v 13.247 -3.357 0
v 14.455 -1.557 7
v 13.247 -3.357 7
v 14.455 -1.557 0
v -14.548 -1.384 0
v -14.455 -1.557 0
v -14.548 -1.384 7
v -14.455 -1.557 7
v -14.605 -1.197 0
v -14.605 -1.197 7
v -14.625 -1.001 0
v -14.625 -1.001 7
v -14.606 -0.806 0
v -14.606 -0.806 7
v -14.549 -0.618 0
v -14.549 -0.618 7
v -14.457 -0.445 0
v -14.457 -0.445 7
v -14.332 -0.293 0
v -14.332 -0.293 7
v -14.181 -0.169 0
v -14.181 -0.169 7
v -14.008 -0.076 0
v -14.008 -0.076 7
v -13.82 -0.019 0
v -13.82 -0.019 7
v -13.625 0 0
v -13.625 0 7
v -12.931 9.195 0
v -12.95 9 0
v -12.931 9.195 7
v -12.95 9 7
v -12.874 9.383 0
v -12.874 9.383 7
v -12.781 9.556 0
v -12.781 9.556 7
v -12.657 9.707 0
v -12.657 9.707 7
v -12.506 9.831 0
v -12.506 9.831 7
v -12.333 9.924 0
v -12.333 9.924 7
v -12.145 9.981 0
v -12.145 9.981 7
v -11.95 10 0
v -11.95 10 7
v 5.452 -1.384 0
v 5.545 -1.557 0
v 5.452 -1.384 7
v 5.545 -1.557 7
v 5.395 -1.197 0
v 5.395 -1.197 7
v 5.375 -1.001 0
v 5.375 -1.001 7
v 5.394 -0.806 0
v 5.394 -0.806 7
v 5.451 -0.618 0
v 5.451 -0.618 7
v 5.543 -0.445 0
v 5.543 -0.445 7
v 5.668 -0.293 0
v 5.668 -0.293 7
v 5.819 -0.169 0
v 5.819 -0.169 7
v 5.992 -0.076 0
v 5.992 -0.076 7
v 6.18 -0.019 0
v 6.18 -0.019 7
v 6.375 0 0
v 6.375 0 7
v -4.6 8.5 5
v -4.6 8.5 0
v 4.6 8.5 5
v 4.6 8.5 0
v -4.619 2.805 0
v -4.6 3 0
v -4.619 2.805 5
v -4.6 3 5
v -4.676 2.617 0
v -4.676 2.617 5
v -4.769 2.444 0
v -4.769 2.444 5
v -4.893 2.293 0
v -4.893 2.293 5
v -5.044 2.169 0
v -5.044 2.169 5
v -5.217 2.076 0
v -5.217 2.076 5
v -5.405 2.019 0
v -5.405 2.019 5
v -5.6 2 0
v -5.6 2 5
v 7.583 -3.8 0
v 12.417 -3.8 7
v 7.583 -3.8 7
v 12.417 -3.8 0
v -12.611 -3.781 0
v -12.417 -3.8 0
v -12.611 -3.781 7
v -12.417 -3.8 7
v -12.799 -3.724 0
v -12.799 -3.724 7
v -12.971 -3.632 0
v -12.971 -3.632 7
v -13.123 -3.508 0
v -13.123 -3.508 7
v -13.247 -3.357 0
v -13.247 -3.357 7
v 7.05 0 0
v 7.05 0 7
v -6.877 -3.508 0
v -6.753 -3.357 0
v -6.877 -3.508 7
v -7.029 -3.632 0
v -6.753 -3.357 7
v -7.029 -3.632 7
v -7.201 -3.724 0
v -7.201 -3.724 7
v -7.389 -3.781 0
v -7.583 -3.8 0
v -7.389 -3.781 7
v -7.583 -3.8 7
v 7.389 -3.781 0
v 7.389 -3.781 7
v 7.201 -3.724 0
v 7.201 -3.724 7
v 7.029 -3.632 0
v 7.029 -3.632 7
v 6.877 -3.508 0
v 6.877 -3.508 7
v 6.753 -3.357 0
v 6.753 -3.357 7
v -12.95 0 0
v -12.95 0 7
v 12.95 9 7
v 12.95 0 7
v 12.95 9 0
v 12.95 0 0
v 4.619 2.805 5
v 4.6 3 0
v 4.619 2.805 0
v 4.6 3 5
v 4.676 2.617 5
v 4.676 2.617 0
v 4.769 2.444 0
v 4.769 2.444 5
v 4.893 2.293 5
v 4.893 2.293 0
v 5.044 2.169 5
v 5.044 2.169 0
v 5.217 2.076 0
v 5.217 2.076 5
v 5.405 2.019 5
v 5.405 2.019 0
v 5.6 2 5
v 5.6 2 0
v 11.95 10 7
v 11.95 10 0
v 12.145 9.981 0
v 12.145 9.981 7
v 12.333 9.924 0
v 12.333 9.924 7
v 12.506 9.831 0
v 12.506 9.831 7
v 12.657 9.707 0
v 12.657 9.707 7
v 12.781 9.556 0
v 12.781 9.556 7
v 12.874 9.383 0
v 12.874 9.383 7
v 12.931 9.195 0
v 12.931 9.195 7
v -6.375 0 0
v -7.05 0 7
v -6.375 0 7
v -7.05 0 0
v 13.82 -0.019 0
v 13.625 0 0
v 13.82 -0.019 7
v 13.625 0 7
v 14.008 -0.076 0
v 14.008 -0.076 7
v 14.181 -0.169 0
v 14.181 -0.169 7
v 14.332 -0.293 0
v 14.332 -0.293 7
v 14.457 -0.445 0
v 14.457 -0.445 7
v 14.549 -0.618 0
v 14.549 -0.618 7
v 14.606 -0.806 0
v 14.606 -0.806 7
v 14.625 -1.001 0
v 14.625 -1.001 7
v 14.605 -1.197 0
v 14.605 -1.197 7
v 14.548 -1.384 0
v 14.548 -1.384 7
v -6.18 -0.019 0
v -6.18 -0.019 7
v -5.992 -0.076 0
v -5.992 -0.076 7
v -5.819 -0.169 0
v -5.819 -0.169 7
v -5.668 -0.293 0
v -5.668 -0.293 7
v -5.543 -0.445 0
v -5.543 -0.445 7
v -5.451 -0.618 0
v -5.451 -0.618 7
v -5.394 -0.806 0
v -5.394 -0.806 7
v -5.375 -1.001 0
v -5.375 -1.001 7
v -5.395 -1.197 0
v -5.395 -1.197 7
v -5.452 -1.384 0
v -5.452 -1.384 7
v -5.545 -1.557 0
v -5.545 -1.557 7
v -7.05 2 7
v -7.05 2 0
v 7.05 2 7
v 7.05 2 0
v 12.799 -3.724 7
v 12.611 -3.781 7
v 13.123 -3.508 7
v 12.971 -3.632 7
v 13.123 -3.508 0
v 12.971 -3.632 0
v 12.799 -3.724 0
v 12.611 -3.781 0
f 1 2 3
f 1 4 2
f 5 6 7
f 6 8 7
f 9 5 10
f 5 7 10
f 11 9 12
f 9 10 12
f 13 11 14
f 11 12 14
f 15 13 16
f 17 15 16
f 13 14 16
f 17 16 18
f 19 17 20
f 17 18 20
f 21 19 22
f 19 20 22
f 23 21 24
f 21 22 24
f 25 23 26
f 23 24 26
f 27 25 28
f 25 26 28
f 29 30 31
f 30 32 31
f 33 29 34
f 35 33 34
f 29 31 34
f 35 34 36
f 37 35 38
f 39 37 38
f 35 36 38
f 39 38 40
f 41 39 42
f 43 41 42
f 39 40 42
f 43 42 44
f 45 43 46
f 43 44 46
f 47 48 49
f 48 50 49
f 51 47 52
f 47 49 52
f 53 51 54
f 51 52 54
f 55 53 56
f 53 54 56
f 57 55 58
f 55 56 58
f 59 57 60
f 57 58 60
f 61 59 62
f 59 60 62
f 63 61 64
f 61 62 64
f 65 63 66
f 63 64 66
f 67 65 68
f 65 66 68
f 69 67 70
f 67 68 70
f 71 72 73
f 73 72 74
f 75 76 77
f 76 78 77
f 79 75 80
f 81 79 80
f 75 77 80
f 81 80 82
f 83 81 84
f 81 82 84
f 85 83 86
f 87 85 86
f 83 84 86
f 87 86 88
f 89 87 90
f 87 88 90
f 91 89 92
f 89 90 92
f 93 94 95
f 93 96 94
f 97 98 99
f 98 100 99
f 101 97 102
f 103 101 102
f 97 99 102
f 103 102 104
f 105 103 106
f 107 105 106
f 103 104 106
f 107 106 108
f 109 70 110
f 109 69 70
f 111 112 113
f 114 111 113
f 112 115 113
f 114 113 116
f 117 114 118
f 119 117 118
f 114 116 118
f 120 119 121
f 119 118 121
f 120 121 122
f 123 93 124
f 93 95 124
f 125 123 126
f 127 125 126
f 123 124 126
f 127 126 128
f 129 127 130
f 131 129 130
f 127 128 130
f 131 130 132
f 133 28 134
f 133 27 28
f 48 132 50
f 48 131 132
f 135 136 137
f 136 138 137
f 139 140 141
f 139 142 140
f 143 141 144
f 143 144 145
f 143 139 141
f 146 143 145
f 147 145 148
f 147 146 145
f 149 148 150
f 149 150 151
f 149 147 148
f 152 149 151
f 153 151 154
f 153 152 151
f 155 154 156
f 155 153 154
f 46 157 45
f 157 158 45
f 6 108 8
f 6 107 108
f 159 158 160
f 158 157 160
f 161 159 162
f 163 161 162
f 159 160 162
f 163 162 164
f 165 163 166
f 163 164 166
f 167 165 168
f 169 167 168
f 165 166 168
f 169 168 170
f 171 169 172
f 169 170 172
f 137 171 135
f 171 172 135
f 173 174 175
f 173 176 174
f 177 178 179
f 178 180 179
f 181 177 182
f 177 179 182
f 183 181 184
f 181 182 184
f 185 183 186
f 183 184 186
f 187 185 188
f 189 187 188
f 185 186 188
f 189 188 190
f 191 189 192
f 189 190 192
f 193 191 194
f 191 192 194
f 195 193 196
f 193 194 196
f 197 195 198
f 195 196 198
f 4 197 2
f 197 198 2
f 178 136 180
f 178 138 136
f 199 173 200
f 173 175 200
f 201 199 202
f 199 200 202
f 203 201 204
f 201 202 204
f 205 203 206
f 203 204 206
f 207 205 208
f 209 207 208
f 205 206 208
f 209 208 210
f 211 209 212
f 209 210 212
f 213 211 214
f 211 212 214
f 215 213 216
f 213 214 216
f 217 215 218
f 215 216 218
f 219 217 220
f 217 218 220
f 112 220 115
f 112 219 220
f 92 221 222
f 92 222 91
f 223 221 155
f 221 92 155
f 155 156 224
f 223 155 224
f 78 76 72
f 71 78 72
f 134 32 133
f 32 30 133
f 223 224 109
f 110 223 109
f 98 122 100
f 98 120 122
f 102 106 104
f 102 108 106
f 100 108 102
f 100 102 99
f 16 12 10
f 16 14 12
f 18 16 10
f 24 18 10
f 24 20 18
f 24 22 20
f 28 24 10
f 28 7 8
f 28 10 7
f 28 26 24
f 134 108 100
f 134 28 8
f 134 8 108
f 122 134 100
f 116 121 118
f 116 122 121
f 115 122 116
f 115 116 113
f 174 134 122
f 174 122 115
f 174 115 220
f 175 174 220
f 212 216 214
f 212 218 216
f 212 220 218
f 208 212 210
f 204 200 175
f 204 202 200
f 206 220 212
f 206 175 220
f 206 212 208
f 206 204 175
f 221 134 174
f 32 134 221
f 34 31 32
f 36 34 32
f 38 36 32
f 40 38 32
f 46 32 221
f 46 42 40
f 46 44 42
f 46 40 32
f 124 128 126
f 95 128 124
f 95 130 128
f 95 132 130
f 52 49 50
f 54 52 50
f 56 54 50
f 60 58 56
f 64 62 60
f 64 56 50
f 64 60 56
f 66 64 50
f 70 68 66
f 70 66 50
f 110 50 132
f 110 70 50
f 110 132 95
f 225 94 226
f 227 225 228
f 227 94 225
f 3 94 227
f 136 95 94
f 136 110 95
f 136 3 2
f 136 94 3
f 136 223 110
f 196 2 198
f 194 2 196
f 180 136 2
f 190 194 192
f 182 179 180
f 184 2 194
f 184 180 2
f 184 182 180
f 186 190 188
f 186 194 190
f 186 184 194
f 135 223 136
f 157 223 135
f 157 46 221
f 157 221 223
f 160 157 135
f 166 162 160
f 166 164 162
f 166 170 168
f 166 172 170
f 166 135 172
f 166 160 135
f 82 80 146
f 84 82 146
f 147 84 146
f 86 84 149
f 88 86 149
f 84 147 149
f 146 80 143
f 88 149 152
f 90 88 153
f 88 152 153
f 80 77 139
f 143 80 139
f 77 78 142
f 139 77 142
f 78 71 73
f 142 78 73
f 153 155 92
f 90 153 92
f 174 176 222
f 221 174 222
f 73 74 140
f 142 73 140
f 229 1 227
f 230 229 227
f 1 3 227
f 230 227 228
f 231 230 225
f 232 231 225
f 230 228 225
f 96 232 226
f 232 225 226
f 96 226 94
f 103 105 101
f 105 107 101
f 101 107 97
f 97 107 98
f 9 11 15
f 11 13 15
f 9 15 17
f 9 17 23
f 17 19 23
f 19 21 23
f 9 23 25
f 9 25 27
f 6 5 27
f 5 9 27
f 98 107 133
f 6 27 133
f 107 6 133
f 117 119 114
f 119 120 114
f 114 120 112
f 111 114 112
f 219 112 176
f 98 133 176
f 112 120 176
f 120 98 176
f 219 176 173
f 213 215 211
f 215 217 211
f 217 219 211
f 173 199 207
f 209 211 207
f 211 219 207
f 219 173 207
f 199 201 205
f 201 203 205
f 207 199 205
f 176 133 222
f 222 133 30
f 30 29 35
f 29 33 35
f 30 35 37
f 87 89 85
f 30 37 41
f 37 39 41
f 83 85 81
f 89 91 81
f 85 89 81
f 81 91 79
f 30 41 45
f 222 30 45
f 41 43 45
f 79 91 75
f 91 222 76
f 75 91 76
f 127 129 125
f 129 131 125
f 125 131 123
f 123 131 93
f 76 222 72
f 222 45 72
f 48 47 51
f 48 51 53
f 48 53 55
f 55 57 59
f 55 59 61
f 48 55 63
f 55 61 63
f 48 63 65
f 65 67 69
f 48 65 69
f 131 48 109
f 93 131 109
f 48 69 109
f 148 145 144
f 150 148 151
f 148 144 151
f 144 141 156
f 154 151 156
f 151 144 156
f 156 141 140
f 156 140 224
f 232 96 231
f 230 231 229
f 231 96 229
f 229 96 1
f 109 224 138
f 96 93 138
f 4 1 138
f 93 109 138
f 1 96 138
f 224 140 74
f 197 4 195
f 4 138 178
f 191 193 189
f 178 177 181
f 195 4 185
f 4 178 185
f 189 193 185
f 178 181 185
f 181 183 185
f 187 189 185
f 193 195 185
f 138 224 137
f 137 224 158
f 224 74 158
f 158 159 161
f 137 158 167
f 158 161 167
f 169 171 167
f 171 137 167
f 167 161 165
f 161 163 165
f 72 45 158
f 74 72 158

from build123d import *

# Parameters (mm, degrees)
BOSS_EXTRUDE1_DEPTH = 5
BOSS_EXTRUDE2_START = 5
SKETCH1_3_W         = 9.2
SKETCH1_3_H         = 6.5
BOSS_EXTRUDE2_DEPTH = 2
FILLET1_R           = 1


with BuildPart() as part:
    # Sketch1 → Boss-Extrude1 (new body)
    with BuildSketch(Plane.XY):
        Polygon((-12.95, 0), (-7.05, 0), (-7.05, 2), (-4.6, 2), (-4.6, 8.5), (4.6, 8.5), (4.6, 2), (7.05, 2), (7.05, 0), (12.95, 0), (12.95, 2), (12.95, 10), (-12.95, 10), (-12.95, 2), align=None)
        Polygon((-7.05, -3.8), (-12.95, -3.8), (-15.5, 0), (-4.5, 0), align=None)
        Polygon((4.5, 0), (15.5, 0), (12.95, -3.8), (7.05, -3.8), align=None)
    extrude(amount=BOSS_EXTRUDE1_DEPTH)

    # Sketch1<3> → Boss-Extrude2 (add)
    with BuildSketch(Plane.XY.offset(BOSS_EXTRUDE2_START)):
        with Locations((0, 5.25)):
            Rectangle(SKETCH1_3_W, SKETCH1_3_H)
        Polygon((-12.95, 0), (-7.05, 0), (-7.05, 2), (-4.6, 2), (-4.6, 8.5), (4.6, 8.5), (4.6, 2), (7.05, 2), (7.05, 0), (12.95, 0), (12.95, 2), (12.95, 10), (-12.95, 10), (-12.95, 2), align=None)
        Polygon((-7.05, -3.8), (-12.95, -3.8), (-15.5, 0), (-4.5, 0), align=None)
        Polygon((4.5, 0), (15.5, 0), (12.95, -3.8), (7.05, -3.8), align=None)
    extrude(amount=BOSS_EXTRUDE2_DEPTH)

    # Fillet1
    fillet1_edges = [part.edges().sort_by_distance(p)[0] for p in [
        (-4.5, 0, 3.5),
        (-7.05, -3.8, 3.5),
        (-12.95, -3.8, 3.5),
        (-15.5, 0, 3.5),
        (-12.95, 10, 3.5),
        (12.95, 10, 3.5),
        (15.5, 0, 3.5),
        (12.95, -3.8, 3.5),
        (7.05, -3.8, 3.5),
        (4.5, 0, 3.5),
        (4.6, 2, 2.5),
        (-4.6, 2, 2.5),
    ]]
    fillet(fillet1_edges, radius=FILLET1_R)


solid = part.part
